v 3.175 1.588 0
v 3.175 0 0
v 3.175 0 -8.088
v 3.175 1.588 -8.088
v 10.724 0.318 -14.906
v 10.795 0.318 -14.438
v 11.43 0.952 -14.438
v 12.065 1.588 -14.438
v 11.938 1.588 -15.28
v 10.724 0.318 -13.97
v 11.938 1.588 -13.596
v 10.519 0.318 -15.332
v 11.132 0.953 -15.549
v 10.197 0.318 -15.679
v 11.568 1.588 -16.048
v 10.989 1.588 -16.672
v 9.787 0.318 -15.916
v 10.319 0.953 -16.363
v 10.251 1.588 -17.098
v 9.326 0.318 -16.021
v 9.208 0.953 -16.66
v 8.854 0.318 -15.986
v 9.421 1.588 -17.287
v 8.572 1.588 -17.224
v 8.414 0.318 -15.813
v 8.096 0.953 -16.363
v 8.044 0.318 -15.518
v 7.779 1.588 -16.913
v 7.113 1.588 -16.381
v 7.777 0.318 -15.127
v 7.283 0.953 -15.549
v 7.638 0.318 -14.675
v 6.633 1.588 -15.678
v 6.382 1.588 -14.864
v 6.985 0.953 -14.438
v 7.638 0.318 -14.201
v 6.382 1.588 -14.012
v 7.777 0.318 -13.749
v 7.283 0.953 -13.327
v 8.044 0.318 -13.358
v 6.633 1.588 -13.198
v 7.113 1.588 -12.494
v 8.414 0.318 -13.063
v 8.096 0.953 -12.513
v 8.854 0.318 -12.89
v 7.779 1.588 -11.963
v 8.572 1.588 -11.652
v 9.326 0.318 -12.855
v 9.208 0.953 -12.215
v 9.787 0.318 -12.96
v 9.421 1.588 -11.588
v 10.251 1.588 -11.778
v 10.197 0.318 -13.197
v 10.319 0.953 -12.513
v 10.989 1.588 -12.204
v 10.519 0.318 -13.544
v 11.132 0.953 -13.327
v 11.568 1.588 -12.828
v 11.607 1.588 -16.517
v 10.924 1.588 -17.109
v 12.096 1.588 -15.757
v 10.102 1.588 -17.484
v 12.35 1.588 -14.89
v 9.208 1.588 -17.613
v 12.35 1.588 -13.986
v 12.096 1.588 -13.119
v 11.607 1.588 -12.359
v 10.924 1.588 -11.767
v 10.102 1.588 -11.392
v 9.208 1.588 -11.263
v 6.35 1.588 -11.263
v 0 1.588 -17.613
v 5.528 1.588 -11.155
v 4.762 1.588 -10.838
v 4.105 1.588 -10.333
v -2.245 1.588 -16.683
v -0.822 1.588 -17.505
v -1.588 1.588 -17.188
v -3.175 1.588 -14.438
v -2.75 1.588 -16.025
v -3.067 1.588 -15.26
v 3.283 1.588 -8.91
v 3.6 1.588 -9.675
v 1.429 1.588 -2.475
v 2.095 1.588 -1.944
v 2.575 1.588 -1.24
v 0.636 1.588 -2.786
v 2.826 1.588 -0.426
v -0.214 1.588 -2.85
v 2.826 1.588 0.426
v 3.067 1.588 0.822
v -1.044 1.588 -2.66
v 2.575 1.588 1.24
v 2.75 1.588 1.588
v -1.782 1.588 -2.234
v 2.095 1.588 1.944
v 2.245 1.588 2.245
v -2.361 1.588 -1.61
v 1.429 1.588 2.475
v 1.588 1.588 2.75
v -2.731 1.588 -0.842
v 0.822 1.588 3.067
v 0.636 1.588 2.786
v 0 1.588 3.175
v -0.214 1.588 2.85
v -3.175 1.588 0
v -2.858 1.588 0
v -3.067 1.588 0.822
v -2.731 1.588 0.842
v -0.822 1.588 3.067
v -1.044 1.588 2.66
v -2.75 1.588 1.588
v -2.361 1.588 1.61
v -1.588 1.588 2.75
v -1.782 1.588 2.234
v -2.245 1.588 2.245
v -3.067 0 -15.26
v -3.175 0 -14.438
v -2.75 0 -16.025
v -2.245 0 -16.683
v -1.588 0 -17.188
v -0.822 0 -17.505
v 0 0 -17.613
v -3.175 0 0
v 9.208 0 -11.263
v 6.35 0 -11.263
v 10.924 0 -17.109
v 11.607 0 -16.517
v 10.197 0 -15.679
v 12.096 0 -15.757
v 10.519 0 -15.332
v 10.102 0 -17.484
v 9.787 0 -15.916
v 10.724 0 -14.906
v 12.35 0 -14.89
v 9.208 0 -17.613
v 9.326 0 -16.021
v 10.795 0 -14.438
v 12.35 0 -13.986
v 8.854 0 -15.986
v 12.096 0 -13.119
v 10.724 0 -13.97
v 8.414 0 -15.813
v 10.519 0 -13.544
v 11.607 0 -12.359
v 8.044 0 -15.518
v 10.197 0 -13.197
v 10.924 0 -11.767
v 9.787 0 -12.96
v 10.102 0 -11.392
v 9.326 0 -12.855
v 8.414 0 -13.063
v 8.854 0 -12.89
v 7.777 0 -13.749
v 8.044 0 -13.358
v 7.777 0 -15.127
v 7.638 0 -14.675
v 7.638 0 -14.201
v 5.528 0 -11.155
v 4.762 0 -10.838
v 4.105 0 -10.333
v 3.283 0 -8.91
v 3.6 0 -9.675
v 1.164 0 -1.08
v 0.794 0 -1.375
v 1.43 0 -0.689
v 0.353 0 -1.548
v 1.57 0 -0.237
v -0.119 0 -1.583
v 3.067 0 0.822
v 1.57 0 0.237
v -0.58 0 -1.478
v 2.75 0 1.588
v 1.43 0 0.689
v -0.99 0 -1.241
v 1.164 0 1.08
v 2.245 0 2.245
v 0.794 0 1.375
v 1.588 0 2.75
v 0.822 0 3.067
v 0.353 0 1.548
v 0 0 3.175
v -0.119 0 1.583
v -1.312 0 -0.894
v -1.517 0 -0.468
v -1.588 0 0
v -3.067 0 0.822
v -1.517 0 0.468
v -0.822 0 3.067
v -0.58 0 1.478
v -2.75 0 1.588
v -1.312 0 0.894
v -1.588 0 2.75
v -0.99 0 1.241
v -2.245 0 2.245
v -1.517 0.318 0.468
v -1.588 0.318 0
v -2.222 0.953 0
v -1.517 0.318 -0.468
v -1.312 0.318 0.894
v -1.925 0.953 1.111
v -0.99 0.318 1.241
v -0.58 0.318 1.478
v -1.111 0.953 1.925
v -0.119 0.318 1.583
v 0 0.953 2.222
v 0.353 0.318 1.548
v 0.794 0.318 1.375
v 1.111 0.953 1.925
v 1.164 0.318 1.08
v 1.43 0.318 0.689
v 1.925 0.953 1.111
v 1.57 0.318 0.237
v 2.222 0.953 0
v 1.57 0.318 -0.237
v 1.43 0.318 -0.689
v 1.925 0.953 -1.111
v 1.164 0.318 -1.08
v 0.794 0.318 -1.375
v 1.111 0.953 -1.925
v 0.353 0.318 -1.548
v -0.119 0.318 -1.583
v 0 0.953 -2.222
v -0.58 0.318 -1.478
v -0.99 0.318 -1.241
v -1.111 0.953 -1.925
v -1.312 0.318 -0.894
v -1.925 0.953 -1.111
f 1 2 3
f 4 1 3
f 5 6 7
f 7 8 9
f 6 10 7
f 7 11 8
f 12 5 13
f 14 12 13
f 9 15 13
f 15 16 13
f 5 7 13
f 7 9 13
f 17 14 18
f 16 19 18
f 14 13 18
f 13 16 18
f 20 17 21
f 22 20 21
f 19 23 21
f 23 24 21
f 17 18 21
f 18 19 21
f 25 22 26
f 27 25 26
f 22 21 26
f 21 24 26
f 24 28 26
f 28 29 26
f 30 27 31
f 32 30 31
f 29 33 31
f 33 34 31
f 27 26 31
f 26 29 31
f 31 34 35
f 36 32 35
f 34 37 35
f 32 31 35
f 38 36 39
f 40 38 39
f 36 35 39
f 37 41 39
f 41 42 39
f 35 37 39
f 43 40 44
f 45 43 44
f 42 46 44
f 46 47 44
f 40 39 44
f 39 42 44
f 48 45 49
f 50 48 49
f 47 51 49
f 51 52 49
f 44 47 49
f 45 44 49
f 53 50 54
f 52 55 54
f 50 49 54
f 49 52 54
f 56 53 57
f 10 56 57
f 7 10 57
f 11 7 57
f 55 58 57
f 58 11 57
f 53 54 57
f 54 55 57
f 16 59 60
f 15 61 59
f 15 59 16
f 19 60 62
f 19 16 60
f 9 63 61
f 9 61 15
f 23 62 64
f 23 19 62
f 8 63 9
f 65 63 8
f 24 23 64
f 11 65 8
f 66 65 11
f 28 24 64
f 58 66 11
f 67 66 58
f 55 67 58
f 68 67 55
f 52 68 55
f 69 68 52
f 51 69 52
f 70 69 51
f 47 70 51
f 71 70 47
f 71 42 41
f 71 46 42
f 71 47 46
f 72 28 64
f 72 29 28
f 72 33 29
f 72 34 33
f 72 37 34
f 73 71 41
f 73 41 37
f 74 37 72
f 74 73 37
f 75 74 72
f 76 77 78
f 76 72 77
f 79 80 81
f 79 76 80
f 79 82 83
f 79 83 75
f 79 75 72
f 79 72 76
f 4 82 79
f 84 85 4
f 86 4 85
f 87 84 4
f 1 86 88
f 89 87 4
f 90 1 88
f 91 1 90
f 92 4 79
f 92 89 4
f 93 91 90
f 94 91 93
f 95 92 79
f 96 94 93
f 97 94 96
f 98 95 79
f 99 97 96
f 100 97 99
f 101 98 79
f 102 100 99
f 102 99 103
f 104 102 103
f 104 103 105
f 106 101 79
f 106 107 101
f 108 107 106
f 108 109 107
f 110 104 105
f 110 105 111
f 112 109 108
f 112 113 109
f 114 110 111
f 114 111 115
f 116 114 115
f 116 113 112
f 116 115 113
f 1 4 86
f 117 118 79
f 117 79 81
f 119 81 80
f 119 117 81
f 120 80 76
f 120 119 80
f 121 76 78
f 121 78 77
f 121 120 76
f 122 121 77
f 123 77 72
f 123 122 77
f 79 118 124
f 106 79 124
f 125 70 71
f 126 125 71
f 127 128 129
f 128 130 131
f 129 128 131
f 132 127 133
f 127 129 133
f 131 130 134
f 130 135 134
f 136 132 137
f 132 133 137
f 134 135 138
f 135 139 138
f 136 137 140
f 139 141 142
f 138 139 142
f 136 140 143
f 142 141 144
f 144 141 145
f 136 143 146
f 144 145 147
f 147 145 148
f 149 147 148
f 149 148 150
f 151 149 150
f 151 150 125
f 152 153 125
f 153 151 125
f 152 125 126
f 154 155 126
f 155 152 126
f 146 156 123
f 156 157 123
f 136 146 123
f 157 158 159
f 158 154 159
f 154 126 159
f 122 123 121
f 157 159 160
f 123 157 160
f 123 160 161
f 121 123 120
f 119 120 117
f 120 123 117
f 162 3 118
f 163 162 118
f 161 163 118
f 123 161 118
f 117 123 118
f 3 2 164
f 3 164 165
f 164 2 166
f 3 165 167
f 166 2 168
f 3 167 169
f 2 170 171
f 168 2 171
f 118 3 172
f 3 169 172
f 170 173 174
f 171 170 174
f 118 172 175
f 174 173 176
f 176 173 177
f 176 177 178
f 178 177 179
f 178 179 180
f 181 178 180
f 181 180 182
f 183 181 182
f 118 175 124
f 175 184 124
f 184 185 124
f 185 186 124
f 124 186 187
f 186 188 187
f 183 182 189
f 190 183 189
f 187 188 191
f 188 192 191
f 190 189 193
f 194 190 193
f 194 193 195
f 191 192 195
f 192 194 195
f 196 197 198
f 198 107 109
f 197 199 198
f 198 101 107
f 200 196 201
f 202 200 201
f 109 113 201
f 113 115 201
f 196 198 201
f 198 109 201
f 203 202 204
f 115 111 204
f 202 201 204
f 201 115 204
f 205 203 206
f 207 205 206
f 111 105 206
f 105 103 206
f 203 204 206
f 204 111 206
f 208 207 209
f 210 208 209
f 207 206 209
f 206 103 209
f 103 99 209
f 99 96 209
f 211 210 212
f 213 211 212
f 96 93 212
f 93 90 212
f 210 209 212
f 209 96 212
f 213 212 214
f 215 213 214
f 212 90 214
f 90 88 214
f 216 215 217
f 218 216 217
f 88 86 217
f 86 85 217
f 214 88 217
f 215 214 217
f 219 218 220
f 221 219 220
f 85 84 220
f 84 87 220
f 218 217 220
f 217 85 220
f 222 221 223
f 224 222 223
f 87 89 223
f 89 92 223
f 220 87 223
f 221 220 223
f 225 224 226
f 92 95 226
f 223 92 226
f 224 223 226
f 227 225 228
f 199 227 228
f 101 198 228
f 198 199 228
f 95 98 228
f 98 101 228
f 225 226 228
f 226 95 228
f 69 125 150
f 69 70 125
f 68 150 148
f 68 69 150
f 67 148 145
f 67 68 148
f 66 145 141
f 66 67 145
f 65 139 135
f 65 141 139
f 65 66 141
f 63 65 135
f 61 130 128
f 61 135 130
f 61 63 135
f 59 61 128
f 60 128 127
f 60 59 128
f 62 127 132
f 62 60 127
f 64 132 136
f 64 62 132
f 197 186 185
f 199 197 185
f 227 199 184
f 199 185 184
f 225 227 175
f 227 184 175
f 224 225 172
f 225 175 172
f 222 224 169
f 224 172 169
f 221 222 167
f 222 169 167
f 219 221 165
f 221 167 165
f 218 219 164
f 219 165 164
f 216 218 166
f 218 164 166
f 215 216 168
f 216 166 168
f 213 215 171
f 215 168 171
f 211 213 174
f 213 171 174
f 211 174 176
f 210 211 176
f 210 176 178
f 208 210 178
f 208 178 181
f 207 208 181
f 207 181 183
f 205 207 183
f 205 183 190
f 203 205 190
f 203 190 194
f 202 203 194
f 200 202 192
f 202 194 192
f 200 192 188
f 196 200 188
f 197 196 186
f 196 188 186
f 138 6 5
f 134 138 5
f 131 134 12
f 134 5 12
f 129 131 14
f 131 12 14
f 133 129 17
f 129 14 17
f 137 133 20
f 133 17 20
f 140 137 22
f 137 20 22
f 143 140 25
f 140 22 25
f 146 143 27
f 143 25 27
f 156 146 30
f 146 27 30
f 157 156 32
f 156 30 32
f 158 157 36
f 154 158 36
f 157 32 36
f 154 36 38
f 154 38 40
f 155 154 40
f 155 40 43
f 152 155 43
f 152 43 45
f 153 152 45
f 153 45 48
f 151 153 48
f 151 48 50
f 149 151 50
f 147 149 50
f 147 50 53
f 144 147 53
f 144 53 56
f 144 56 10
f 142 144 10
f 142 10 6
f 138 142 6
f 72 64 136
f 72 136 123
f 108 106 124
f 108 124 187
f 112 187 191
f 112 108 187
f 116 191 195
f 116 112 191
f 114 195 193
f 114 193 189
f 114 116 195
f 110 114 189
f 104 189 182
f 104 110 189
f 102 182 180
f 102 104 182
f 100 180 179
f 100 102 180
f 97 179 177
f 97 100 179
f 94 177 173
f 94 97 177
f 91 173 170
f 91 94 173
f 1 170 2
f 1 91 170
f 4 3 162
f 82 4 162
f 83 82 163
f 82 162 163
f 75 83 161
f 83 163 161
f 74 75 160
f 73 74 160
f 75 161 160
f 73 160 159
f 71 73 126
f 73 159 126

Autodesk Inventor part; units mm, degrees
ref_plane "YZ Plane" through (0, 0, 0) normal (1, 0, 0) x (0, 1, 0)
ref_plane "XZ Plane" through (0, 0, 0) normal (0, 1, 0) x (-1, 0, 0)
ref_plane "XY Plane" through (0, 0, 0) normal (0, 0, 1) x (1, 0, 0)
sketch "Sketch1" plane through (0, 0, 0) normal (0, 1, 0) x (-1, 0, 0)
  circle A0 centre (0, 0) radius 1.5875
  line L0 (3.175, 3.175) -> (-3.175, 3.175)
  line L1 (-3.175, 3.175) -> (-3.175, -15.24)
  line L2 (-3.175, -15.24) -> (3.175, -15.24)
  line L3 (3.175, -15.24) -> (3.175, 3.175)
  dimension "d0" = 3.175
  dimension "d1" = 3.175
  dimension "d2" = 3.175
  dimension "d3" = 3.175
  dimension "d4" = 15.24
extrude "Extrusion1" add sketch "Sketch1" along normal blind 1.5875
chamfer "Chamfer1" distance 1.27 angle 45 1 edges at (1.5875, 1.5875, 0)
sketch "Sketch2" plane through (0, 1.5875, 0) normal (0, 1, 0) x (1, 0, 0)
  line L0 (-3.175, 15.24) -> (-3.175, -3.175) projected
  line L1 (3.175, -3.175) -> (3.175, 15.24) projected
  circle A0 centre (0, 0) radius 2.8575 projected
  circle A1 centre (9.2075, 14.4379) radius 1.5875
  circle A2 centre (9.2075, 14.4379) radius 3.175
  line L2 (9.2075, 17.6129) -> (3.175, 17.6129)
  line L3 (3.175, 0) -> (3.175, 15.875) projected
  line L4 (9.2075, 11.2629) -> (3.175, 11.2629)
  line L5 (-3.175, -3.175) -> (3.175, -3.175) projected
  line L6 (3.175, 15.24) -> (-3.175, 15.24) projected
  line L7 (3.175, 17.6129) -> (-3.175, 17.6129)
  line L8 (3.175, 15.24) -> (-3.175, 15.24) projected
  line L9 (-3.175, 17.6129) -> (-3.175, 15.24)
  line L10 (3.175, -3.175) -> (3.175, 15.24) projected
  line L11 (-3.175, 15.24) -> (3.175, 15.24)
  line L12 (3.175, 15.24) -> (3.175, 11.2629)
  dimension "d11" = 9.2075
  dimension "d12" = 14.4379
  dimension "d13" = 3.175
  dimension "d14" = 6.35
extrude "Extrusion3" add sketch "Sketch2" against normal up to surface (1.5875 mm away) contours L9 L7 L2 A2 L4 L1 L6 | A2
fillet "Fillet3" radius 3.175 4 edges at (3.175, 0.7937, -11.2629) (-3.175, 0.7937, -17.6129) (-3.175, 0.7937, 3.175) (3.175, 0.7937, 3.175)
chamfer "Chamfer3" distance 1.27 angle 45 1 edges at (7.62, 1.5875, -14.4379)
properties part number "limitSwitchHolder2Backplate" material "ABS Plastic"
